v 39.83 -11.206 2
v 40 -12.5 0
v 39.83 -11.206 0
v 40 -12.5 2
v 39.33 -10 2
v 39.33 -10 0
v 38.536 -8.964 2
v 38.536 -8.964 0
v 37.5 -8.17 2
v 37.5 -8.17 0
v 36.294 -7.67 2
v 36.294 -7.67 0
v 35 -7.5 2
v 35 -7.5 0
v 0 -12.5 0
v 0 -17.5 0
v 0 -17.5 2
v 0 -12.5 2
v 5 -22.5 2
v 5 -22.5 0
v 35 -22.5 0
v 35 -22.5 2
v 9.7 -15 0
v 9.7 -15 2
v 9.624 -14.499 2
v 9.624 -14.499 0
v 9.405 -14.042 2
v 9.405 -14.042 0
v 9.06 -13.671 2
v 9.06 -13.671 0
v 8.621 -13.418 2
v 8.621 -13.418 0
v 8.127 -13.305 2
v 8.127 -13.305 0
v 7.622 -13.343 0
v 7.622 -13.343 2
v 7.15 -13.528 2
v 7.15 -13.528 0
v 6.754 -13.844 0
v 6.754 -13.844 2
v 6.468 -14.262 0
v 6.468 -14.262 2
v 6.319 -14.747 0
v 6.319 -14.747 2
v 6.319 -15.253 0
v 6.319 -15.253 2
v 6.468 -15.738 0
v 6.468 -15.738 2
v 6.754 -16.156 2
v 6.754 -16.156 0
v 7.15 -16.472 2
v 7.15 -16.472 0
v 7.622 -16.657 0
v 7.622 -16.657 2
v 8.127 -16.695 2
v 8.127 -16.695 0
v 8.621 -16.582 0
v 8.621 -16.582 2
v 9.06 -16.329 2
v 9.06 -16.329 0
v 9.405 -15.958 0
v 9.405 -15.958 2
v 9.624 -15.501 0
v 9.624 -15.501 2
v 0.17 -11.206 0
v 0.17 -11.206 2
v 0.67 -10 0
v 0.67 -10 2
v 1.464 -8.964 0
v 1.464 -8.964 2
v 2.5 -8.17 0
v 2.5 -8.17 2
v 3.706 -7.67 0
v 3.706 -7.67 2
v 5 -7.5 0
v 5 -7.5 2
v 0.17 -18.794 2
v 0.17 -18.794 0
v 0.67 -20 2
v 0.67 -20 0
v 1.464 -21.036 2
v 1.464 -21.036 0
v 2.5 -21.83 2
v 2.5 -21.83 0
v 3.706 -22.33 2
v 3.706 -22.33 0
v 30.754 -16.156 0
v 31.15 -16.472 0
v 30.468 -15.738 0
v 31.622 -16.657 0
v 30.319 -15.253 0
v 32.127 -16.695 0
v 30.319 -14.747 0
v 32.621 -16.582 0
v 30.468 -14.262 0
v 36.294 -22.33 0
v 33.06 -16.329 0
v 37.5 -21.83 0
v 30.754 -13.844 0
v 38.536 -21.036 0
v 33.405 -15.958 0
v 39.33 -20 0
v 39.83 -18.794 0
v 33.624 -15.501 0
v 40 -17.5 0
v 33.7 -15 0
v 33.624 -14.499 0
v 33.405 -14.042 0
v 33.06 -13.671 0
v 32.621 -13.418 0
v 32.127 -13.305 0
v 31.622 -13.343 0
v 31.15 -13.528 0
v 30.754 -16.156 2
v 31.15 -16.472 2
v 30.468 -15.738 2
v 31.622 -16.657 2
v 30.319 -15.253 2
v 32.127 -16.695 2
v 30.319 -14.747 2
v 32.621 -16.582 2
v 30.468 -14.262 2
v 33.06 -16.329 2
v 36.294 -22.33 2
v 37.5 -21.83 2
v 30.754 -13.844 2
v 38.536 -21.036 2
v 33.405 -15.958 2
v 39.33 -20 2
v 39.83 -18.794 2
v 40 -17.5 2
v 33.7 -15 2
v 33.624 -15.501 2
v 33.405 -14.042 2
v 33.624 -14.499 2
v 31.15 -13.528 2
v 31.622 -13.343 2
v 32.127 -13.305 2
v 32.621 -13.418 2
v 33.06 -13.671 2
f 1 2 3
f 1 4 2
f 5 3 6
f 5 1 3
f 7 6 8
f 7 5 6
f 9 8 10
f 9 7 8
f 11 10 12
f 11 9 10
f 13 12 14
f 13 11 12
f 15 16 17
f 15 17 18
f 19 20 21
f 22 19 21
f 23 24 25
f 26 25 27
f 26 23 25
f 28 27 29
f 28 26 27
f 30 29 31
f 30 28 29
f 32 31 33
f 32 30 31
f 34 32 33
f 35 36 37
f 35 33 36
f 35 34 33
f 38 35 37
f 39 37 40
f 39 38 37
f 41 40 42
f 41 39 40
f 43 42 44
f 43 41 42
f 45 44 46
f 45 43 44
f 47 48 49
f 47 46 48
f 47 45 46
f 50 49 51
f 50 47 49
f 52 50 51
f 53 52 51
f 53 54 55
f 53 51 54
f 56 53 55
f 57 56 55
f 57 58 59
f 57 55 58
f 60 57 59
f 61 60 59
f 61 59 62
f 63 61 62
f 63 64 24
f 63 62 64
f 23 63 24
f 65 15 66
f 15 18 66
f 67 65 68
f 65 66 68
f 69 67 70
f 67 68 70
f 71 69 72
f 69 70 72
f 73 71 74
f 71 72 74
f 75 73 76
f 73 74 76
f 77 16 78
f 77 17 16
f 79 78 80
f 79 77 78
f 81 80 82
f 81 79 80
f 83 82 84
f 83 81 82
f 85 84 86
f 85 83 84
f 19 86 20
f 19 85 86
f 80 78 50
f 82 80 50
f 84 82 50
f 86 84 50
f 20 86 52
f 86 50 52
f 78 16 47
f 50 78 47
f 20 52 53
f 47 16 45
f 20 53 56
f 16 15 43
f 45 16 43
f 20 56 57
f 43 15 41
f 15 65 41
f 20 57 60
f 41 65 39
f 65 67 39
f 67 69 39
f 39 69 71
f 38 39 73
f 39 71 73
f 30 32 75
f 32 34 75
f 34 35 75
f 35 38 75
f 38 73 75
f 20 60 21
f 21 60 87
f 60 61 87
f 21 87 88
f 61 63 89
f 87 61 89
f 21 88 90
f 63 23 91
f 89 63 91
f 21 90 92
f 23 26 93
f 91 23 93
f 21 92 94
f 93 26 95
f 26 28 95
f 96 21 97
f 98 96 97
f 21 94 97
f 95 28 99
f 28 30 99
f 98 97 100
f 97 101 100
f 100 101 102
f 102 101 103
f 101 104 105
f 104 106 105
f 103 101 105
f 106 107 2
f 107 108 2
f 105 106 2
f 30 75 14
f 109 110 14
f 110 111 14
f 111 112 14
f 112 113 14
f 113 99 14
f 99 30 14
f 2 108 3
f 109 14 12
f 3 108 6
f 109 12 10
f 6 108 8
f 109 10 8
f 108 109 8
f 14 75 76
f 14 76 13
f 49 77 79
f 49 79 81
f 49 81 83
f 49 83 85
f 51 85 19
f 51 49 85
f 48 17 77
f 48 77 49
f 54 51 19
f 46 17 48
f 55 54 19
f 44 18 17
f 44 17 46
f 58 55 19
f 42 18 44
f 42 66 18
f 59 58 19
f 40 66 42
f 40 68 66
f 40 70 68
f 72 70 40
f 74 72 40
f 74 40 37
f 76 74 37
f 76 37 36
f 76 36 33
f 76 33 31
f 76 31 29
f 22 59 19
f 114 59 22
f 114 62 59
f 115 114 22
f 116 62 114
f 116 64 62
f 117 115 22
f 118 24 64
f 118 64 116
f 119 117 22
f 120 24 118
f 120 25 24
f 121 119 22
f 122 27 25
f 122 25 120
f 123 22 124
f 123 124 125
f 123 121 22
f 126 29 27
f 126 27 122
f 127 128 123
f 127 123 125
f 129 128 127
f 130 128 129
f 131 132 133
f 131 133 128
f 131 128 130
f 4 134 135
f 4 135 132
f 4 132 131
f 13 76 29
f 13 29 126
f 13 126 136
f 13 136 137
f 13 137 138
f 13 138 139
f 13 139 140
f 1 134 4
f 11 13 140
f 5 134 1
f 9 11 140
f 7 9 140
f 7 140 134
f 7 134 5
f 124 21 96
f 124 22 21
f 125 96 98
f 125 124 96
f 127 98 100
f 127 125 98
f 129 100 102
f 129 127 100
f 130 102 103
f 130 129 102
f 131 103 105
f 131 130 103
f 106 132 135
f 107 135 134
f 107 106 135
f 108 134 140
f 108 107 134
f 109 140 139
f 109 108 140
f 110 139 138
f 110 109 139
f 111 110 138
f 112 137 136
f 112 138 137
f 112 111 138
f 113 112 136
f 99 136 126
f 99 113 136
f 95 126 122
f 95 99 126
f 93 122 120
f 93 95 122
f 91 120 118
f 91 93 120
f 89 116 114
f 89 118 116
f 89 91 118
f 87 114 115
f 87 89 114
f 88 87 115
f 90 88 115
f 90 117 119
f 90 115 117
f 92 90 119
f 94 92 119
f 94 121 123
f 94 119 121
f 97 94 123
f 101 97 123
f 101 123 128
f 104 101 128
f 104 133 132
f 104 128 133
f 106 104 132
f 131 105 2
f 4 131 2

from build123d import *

# Parameters (mm, degrees)
CYLINDER001_R     = 1.7
CYLINDER001_DEPTH = 10
CYLINDER_R        = 1.7
CYLINDER_DEPTH    = 10
BOX003_W          = 40
BOX003_H          = 15
BOX003_DEPTH      = 2
FILLET003_R       = 5


with BuildPart() as cylinder001:
    # Cylinder001 → Cylinder001 (new body)
    with BuildSketch(Plane(origin=(32, 0, 0), x_dir=(1, 0, 0), z_dir=(0, 0, 1))):
        Circle(CYLINDER001_R)
    extrude(amount=CYLINDER001_DEPTH)


with BuildPart() as cylinder:
    # Cylinder → Cylinder (new body)
    with BuildSketch(Plane(origin=(8, 0, 0), x_dir=(1, 0, 0), z_dir=(0, 0, 1))):
        Circle(CYLINDER_R)
    extrude(amount=CYLINDER_DEPTH)


with BuildPart() as union:
    # Box003 → Box003 (new body)
    with BuildSketch(Plane.XY):
        with Locations((20, 7.5)):
            Rectangle(BOX003_W, BOX003_H)
    extrude(amount=BOX003_DEPTH)

    # Fillet003
    fillet003_edges = [union.edges().sort_by_distance(p)[0] for p in [
        (0, 0, 1),
        (0, 15, 1),
        (40, 0, 1),
        (40, 15, 1),
    ]]
    fillet(fillet003_edges, radius=FILLET003_R)


with BuildPart() as union_1:
    # Fillet003 placement: moved
    add(union.part.moved(Location((0, -7.5, 0))))

    # Cut002: cut Cylinder
    add(cylinder.part, mode=Mode.SUBTRACT)

    # Cut003: cut Cylinder001
    add(cylinder001.part, mode=Mode.SUBTRACT)


with BuildPart() as union_2:
    # Cut003 placement: moved
    add(union_1.part.moved(Location((0, -15, 0))))


solid = union_2.part
